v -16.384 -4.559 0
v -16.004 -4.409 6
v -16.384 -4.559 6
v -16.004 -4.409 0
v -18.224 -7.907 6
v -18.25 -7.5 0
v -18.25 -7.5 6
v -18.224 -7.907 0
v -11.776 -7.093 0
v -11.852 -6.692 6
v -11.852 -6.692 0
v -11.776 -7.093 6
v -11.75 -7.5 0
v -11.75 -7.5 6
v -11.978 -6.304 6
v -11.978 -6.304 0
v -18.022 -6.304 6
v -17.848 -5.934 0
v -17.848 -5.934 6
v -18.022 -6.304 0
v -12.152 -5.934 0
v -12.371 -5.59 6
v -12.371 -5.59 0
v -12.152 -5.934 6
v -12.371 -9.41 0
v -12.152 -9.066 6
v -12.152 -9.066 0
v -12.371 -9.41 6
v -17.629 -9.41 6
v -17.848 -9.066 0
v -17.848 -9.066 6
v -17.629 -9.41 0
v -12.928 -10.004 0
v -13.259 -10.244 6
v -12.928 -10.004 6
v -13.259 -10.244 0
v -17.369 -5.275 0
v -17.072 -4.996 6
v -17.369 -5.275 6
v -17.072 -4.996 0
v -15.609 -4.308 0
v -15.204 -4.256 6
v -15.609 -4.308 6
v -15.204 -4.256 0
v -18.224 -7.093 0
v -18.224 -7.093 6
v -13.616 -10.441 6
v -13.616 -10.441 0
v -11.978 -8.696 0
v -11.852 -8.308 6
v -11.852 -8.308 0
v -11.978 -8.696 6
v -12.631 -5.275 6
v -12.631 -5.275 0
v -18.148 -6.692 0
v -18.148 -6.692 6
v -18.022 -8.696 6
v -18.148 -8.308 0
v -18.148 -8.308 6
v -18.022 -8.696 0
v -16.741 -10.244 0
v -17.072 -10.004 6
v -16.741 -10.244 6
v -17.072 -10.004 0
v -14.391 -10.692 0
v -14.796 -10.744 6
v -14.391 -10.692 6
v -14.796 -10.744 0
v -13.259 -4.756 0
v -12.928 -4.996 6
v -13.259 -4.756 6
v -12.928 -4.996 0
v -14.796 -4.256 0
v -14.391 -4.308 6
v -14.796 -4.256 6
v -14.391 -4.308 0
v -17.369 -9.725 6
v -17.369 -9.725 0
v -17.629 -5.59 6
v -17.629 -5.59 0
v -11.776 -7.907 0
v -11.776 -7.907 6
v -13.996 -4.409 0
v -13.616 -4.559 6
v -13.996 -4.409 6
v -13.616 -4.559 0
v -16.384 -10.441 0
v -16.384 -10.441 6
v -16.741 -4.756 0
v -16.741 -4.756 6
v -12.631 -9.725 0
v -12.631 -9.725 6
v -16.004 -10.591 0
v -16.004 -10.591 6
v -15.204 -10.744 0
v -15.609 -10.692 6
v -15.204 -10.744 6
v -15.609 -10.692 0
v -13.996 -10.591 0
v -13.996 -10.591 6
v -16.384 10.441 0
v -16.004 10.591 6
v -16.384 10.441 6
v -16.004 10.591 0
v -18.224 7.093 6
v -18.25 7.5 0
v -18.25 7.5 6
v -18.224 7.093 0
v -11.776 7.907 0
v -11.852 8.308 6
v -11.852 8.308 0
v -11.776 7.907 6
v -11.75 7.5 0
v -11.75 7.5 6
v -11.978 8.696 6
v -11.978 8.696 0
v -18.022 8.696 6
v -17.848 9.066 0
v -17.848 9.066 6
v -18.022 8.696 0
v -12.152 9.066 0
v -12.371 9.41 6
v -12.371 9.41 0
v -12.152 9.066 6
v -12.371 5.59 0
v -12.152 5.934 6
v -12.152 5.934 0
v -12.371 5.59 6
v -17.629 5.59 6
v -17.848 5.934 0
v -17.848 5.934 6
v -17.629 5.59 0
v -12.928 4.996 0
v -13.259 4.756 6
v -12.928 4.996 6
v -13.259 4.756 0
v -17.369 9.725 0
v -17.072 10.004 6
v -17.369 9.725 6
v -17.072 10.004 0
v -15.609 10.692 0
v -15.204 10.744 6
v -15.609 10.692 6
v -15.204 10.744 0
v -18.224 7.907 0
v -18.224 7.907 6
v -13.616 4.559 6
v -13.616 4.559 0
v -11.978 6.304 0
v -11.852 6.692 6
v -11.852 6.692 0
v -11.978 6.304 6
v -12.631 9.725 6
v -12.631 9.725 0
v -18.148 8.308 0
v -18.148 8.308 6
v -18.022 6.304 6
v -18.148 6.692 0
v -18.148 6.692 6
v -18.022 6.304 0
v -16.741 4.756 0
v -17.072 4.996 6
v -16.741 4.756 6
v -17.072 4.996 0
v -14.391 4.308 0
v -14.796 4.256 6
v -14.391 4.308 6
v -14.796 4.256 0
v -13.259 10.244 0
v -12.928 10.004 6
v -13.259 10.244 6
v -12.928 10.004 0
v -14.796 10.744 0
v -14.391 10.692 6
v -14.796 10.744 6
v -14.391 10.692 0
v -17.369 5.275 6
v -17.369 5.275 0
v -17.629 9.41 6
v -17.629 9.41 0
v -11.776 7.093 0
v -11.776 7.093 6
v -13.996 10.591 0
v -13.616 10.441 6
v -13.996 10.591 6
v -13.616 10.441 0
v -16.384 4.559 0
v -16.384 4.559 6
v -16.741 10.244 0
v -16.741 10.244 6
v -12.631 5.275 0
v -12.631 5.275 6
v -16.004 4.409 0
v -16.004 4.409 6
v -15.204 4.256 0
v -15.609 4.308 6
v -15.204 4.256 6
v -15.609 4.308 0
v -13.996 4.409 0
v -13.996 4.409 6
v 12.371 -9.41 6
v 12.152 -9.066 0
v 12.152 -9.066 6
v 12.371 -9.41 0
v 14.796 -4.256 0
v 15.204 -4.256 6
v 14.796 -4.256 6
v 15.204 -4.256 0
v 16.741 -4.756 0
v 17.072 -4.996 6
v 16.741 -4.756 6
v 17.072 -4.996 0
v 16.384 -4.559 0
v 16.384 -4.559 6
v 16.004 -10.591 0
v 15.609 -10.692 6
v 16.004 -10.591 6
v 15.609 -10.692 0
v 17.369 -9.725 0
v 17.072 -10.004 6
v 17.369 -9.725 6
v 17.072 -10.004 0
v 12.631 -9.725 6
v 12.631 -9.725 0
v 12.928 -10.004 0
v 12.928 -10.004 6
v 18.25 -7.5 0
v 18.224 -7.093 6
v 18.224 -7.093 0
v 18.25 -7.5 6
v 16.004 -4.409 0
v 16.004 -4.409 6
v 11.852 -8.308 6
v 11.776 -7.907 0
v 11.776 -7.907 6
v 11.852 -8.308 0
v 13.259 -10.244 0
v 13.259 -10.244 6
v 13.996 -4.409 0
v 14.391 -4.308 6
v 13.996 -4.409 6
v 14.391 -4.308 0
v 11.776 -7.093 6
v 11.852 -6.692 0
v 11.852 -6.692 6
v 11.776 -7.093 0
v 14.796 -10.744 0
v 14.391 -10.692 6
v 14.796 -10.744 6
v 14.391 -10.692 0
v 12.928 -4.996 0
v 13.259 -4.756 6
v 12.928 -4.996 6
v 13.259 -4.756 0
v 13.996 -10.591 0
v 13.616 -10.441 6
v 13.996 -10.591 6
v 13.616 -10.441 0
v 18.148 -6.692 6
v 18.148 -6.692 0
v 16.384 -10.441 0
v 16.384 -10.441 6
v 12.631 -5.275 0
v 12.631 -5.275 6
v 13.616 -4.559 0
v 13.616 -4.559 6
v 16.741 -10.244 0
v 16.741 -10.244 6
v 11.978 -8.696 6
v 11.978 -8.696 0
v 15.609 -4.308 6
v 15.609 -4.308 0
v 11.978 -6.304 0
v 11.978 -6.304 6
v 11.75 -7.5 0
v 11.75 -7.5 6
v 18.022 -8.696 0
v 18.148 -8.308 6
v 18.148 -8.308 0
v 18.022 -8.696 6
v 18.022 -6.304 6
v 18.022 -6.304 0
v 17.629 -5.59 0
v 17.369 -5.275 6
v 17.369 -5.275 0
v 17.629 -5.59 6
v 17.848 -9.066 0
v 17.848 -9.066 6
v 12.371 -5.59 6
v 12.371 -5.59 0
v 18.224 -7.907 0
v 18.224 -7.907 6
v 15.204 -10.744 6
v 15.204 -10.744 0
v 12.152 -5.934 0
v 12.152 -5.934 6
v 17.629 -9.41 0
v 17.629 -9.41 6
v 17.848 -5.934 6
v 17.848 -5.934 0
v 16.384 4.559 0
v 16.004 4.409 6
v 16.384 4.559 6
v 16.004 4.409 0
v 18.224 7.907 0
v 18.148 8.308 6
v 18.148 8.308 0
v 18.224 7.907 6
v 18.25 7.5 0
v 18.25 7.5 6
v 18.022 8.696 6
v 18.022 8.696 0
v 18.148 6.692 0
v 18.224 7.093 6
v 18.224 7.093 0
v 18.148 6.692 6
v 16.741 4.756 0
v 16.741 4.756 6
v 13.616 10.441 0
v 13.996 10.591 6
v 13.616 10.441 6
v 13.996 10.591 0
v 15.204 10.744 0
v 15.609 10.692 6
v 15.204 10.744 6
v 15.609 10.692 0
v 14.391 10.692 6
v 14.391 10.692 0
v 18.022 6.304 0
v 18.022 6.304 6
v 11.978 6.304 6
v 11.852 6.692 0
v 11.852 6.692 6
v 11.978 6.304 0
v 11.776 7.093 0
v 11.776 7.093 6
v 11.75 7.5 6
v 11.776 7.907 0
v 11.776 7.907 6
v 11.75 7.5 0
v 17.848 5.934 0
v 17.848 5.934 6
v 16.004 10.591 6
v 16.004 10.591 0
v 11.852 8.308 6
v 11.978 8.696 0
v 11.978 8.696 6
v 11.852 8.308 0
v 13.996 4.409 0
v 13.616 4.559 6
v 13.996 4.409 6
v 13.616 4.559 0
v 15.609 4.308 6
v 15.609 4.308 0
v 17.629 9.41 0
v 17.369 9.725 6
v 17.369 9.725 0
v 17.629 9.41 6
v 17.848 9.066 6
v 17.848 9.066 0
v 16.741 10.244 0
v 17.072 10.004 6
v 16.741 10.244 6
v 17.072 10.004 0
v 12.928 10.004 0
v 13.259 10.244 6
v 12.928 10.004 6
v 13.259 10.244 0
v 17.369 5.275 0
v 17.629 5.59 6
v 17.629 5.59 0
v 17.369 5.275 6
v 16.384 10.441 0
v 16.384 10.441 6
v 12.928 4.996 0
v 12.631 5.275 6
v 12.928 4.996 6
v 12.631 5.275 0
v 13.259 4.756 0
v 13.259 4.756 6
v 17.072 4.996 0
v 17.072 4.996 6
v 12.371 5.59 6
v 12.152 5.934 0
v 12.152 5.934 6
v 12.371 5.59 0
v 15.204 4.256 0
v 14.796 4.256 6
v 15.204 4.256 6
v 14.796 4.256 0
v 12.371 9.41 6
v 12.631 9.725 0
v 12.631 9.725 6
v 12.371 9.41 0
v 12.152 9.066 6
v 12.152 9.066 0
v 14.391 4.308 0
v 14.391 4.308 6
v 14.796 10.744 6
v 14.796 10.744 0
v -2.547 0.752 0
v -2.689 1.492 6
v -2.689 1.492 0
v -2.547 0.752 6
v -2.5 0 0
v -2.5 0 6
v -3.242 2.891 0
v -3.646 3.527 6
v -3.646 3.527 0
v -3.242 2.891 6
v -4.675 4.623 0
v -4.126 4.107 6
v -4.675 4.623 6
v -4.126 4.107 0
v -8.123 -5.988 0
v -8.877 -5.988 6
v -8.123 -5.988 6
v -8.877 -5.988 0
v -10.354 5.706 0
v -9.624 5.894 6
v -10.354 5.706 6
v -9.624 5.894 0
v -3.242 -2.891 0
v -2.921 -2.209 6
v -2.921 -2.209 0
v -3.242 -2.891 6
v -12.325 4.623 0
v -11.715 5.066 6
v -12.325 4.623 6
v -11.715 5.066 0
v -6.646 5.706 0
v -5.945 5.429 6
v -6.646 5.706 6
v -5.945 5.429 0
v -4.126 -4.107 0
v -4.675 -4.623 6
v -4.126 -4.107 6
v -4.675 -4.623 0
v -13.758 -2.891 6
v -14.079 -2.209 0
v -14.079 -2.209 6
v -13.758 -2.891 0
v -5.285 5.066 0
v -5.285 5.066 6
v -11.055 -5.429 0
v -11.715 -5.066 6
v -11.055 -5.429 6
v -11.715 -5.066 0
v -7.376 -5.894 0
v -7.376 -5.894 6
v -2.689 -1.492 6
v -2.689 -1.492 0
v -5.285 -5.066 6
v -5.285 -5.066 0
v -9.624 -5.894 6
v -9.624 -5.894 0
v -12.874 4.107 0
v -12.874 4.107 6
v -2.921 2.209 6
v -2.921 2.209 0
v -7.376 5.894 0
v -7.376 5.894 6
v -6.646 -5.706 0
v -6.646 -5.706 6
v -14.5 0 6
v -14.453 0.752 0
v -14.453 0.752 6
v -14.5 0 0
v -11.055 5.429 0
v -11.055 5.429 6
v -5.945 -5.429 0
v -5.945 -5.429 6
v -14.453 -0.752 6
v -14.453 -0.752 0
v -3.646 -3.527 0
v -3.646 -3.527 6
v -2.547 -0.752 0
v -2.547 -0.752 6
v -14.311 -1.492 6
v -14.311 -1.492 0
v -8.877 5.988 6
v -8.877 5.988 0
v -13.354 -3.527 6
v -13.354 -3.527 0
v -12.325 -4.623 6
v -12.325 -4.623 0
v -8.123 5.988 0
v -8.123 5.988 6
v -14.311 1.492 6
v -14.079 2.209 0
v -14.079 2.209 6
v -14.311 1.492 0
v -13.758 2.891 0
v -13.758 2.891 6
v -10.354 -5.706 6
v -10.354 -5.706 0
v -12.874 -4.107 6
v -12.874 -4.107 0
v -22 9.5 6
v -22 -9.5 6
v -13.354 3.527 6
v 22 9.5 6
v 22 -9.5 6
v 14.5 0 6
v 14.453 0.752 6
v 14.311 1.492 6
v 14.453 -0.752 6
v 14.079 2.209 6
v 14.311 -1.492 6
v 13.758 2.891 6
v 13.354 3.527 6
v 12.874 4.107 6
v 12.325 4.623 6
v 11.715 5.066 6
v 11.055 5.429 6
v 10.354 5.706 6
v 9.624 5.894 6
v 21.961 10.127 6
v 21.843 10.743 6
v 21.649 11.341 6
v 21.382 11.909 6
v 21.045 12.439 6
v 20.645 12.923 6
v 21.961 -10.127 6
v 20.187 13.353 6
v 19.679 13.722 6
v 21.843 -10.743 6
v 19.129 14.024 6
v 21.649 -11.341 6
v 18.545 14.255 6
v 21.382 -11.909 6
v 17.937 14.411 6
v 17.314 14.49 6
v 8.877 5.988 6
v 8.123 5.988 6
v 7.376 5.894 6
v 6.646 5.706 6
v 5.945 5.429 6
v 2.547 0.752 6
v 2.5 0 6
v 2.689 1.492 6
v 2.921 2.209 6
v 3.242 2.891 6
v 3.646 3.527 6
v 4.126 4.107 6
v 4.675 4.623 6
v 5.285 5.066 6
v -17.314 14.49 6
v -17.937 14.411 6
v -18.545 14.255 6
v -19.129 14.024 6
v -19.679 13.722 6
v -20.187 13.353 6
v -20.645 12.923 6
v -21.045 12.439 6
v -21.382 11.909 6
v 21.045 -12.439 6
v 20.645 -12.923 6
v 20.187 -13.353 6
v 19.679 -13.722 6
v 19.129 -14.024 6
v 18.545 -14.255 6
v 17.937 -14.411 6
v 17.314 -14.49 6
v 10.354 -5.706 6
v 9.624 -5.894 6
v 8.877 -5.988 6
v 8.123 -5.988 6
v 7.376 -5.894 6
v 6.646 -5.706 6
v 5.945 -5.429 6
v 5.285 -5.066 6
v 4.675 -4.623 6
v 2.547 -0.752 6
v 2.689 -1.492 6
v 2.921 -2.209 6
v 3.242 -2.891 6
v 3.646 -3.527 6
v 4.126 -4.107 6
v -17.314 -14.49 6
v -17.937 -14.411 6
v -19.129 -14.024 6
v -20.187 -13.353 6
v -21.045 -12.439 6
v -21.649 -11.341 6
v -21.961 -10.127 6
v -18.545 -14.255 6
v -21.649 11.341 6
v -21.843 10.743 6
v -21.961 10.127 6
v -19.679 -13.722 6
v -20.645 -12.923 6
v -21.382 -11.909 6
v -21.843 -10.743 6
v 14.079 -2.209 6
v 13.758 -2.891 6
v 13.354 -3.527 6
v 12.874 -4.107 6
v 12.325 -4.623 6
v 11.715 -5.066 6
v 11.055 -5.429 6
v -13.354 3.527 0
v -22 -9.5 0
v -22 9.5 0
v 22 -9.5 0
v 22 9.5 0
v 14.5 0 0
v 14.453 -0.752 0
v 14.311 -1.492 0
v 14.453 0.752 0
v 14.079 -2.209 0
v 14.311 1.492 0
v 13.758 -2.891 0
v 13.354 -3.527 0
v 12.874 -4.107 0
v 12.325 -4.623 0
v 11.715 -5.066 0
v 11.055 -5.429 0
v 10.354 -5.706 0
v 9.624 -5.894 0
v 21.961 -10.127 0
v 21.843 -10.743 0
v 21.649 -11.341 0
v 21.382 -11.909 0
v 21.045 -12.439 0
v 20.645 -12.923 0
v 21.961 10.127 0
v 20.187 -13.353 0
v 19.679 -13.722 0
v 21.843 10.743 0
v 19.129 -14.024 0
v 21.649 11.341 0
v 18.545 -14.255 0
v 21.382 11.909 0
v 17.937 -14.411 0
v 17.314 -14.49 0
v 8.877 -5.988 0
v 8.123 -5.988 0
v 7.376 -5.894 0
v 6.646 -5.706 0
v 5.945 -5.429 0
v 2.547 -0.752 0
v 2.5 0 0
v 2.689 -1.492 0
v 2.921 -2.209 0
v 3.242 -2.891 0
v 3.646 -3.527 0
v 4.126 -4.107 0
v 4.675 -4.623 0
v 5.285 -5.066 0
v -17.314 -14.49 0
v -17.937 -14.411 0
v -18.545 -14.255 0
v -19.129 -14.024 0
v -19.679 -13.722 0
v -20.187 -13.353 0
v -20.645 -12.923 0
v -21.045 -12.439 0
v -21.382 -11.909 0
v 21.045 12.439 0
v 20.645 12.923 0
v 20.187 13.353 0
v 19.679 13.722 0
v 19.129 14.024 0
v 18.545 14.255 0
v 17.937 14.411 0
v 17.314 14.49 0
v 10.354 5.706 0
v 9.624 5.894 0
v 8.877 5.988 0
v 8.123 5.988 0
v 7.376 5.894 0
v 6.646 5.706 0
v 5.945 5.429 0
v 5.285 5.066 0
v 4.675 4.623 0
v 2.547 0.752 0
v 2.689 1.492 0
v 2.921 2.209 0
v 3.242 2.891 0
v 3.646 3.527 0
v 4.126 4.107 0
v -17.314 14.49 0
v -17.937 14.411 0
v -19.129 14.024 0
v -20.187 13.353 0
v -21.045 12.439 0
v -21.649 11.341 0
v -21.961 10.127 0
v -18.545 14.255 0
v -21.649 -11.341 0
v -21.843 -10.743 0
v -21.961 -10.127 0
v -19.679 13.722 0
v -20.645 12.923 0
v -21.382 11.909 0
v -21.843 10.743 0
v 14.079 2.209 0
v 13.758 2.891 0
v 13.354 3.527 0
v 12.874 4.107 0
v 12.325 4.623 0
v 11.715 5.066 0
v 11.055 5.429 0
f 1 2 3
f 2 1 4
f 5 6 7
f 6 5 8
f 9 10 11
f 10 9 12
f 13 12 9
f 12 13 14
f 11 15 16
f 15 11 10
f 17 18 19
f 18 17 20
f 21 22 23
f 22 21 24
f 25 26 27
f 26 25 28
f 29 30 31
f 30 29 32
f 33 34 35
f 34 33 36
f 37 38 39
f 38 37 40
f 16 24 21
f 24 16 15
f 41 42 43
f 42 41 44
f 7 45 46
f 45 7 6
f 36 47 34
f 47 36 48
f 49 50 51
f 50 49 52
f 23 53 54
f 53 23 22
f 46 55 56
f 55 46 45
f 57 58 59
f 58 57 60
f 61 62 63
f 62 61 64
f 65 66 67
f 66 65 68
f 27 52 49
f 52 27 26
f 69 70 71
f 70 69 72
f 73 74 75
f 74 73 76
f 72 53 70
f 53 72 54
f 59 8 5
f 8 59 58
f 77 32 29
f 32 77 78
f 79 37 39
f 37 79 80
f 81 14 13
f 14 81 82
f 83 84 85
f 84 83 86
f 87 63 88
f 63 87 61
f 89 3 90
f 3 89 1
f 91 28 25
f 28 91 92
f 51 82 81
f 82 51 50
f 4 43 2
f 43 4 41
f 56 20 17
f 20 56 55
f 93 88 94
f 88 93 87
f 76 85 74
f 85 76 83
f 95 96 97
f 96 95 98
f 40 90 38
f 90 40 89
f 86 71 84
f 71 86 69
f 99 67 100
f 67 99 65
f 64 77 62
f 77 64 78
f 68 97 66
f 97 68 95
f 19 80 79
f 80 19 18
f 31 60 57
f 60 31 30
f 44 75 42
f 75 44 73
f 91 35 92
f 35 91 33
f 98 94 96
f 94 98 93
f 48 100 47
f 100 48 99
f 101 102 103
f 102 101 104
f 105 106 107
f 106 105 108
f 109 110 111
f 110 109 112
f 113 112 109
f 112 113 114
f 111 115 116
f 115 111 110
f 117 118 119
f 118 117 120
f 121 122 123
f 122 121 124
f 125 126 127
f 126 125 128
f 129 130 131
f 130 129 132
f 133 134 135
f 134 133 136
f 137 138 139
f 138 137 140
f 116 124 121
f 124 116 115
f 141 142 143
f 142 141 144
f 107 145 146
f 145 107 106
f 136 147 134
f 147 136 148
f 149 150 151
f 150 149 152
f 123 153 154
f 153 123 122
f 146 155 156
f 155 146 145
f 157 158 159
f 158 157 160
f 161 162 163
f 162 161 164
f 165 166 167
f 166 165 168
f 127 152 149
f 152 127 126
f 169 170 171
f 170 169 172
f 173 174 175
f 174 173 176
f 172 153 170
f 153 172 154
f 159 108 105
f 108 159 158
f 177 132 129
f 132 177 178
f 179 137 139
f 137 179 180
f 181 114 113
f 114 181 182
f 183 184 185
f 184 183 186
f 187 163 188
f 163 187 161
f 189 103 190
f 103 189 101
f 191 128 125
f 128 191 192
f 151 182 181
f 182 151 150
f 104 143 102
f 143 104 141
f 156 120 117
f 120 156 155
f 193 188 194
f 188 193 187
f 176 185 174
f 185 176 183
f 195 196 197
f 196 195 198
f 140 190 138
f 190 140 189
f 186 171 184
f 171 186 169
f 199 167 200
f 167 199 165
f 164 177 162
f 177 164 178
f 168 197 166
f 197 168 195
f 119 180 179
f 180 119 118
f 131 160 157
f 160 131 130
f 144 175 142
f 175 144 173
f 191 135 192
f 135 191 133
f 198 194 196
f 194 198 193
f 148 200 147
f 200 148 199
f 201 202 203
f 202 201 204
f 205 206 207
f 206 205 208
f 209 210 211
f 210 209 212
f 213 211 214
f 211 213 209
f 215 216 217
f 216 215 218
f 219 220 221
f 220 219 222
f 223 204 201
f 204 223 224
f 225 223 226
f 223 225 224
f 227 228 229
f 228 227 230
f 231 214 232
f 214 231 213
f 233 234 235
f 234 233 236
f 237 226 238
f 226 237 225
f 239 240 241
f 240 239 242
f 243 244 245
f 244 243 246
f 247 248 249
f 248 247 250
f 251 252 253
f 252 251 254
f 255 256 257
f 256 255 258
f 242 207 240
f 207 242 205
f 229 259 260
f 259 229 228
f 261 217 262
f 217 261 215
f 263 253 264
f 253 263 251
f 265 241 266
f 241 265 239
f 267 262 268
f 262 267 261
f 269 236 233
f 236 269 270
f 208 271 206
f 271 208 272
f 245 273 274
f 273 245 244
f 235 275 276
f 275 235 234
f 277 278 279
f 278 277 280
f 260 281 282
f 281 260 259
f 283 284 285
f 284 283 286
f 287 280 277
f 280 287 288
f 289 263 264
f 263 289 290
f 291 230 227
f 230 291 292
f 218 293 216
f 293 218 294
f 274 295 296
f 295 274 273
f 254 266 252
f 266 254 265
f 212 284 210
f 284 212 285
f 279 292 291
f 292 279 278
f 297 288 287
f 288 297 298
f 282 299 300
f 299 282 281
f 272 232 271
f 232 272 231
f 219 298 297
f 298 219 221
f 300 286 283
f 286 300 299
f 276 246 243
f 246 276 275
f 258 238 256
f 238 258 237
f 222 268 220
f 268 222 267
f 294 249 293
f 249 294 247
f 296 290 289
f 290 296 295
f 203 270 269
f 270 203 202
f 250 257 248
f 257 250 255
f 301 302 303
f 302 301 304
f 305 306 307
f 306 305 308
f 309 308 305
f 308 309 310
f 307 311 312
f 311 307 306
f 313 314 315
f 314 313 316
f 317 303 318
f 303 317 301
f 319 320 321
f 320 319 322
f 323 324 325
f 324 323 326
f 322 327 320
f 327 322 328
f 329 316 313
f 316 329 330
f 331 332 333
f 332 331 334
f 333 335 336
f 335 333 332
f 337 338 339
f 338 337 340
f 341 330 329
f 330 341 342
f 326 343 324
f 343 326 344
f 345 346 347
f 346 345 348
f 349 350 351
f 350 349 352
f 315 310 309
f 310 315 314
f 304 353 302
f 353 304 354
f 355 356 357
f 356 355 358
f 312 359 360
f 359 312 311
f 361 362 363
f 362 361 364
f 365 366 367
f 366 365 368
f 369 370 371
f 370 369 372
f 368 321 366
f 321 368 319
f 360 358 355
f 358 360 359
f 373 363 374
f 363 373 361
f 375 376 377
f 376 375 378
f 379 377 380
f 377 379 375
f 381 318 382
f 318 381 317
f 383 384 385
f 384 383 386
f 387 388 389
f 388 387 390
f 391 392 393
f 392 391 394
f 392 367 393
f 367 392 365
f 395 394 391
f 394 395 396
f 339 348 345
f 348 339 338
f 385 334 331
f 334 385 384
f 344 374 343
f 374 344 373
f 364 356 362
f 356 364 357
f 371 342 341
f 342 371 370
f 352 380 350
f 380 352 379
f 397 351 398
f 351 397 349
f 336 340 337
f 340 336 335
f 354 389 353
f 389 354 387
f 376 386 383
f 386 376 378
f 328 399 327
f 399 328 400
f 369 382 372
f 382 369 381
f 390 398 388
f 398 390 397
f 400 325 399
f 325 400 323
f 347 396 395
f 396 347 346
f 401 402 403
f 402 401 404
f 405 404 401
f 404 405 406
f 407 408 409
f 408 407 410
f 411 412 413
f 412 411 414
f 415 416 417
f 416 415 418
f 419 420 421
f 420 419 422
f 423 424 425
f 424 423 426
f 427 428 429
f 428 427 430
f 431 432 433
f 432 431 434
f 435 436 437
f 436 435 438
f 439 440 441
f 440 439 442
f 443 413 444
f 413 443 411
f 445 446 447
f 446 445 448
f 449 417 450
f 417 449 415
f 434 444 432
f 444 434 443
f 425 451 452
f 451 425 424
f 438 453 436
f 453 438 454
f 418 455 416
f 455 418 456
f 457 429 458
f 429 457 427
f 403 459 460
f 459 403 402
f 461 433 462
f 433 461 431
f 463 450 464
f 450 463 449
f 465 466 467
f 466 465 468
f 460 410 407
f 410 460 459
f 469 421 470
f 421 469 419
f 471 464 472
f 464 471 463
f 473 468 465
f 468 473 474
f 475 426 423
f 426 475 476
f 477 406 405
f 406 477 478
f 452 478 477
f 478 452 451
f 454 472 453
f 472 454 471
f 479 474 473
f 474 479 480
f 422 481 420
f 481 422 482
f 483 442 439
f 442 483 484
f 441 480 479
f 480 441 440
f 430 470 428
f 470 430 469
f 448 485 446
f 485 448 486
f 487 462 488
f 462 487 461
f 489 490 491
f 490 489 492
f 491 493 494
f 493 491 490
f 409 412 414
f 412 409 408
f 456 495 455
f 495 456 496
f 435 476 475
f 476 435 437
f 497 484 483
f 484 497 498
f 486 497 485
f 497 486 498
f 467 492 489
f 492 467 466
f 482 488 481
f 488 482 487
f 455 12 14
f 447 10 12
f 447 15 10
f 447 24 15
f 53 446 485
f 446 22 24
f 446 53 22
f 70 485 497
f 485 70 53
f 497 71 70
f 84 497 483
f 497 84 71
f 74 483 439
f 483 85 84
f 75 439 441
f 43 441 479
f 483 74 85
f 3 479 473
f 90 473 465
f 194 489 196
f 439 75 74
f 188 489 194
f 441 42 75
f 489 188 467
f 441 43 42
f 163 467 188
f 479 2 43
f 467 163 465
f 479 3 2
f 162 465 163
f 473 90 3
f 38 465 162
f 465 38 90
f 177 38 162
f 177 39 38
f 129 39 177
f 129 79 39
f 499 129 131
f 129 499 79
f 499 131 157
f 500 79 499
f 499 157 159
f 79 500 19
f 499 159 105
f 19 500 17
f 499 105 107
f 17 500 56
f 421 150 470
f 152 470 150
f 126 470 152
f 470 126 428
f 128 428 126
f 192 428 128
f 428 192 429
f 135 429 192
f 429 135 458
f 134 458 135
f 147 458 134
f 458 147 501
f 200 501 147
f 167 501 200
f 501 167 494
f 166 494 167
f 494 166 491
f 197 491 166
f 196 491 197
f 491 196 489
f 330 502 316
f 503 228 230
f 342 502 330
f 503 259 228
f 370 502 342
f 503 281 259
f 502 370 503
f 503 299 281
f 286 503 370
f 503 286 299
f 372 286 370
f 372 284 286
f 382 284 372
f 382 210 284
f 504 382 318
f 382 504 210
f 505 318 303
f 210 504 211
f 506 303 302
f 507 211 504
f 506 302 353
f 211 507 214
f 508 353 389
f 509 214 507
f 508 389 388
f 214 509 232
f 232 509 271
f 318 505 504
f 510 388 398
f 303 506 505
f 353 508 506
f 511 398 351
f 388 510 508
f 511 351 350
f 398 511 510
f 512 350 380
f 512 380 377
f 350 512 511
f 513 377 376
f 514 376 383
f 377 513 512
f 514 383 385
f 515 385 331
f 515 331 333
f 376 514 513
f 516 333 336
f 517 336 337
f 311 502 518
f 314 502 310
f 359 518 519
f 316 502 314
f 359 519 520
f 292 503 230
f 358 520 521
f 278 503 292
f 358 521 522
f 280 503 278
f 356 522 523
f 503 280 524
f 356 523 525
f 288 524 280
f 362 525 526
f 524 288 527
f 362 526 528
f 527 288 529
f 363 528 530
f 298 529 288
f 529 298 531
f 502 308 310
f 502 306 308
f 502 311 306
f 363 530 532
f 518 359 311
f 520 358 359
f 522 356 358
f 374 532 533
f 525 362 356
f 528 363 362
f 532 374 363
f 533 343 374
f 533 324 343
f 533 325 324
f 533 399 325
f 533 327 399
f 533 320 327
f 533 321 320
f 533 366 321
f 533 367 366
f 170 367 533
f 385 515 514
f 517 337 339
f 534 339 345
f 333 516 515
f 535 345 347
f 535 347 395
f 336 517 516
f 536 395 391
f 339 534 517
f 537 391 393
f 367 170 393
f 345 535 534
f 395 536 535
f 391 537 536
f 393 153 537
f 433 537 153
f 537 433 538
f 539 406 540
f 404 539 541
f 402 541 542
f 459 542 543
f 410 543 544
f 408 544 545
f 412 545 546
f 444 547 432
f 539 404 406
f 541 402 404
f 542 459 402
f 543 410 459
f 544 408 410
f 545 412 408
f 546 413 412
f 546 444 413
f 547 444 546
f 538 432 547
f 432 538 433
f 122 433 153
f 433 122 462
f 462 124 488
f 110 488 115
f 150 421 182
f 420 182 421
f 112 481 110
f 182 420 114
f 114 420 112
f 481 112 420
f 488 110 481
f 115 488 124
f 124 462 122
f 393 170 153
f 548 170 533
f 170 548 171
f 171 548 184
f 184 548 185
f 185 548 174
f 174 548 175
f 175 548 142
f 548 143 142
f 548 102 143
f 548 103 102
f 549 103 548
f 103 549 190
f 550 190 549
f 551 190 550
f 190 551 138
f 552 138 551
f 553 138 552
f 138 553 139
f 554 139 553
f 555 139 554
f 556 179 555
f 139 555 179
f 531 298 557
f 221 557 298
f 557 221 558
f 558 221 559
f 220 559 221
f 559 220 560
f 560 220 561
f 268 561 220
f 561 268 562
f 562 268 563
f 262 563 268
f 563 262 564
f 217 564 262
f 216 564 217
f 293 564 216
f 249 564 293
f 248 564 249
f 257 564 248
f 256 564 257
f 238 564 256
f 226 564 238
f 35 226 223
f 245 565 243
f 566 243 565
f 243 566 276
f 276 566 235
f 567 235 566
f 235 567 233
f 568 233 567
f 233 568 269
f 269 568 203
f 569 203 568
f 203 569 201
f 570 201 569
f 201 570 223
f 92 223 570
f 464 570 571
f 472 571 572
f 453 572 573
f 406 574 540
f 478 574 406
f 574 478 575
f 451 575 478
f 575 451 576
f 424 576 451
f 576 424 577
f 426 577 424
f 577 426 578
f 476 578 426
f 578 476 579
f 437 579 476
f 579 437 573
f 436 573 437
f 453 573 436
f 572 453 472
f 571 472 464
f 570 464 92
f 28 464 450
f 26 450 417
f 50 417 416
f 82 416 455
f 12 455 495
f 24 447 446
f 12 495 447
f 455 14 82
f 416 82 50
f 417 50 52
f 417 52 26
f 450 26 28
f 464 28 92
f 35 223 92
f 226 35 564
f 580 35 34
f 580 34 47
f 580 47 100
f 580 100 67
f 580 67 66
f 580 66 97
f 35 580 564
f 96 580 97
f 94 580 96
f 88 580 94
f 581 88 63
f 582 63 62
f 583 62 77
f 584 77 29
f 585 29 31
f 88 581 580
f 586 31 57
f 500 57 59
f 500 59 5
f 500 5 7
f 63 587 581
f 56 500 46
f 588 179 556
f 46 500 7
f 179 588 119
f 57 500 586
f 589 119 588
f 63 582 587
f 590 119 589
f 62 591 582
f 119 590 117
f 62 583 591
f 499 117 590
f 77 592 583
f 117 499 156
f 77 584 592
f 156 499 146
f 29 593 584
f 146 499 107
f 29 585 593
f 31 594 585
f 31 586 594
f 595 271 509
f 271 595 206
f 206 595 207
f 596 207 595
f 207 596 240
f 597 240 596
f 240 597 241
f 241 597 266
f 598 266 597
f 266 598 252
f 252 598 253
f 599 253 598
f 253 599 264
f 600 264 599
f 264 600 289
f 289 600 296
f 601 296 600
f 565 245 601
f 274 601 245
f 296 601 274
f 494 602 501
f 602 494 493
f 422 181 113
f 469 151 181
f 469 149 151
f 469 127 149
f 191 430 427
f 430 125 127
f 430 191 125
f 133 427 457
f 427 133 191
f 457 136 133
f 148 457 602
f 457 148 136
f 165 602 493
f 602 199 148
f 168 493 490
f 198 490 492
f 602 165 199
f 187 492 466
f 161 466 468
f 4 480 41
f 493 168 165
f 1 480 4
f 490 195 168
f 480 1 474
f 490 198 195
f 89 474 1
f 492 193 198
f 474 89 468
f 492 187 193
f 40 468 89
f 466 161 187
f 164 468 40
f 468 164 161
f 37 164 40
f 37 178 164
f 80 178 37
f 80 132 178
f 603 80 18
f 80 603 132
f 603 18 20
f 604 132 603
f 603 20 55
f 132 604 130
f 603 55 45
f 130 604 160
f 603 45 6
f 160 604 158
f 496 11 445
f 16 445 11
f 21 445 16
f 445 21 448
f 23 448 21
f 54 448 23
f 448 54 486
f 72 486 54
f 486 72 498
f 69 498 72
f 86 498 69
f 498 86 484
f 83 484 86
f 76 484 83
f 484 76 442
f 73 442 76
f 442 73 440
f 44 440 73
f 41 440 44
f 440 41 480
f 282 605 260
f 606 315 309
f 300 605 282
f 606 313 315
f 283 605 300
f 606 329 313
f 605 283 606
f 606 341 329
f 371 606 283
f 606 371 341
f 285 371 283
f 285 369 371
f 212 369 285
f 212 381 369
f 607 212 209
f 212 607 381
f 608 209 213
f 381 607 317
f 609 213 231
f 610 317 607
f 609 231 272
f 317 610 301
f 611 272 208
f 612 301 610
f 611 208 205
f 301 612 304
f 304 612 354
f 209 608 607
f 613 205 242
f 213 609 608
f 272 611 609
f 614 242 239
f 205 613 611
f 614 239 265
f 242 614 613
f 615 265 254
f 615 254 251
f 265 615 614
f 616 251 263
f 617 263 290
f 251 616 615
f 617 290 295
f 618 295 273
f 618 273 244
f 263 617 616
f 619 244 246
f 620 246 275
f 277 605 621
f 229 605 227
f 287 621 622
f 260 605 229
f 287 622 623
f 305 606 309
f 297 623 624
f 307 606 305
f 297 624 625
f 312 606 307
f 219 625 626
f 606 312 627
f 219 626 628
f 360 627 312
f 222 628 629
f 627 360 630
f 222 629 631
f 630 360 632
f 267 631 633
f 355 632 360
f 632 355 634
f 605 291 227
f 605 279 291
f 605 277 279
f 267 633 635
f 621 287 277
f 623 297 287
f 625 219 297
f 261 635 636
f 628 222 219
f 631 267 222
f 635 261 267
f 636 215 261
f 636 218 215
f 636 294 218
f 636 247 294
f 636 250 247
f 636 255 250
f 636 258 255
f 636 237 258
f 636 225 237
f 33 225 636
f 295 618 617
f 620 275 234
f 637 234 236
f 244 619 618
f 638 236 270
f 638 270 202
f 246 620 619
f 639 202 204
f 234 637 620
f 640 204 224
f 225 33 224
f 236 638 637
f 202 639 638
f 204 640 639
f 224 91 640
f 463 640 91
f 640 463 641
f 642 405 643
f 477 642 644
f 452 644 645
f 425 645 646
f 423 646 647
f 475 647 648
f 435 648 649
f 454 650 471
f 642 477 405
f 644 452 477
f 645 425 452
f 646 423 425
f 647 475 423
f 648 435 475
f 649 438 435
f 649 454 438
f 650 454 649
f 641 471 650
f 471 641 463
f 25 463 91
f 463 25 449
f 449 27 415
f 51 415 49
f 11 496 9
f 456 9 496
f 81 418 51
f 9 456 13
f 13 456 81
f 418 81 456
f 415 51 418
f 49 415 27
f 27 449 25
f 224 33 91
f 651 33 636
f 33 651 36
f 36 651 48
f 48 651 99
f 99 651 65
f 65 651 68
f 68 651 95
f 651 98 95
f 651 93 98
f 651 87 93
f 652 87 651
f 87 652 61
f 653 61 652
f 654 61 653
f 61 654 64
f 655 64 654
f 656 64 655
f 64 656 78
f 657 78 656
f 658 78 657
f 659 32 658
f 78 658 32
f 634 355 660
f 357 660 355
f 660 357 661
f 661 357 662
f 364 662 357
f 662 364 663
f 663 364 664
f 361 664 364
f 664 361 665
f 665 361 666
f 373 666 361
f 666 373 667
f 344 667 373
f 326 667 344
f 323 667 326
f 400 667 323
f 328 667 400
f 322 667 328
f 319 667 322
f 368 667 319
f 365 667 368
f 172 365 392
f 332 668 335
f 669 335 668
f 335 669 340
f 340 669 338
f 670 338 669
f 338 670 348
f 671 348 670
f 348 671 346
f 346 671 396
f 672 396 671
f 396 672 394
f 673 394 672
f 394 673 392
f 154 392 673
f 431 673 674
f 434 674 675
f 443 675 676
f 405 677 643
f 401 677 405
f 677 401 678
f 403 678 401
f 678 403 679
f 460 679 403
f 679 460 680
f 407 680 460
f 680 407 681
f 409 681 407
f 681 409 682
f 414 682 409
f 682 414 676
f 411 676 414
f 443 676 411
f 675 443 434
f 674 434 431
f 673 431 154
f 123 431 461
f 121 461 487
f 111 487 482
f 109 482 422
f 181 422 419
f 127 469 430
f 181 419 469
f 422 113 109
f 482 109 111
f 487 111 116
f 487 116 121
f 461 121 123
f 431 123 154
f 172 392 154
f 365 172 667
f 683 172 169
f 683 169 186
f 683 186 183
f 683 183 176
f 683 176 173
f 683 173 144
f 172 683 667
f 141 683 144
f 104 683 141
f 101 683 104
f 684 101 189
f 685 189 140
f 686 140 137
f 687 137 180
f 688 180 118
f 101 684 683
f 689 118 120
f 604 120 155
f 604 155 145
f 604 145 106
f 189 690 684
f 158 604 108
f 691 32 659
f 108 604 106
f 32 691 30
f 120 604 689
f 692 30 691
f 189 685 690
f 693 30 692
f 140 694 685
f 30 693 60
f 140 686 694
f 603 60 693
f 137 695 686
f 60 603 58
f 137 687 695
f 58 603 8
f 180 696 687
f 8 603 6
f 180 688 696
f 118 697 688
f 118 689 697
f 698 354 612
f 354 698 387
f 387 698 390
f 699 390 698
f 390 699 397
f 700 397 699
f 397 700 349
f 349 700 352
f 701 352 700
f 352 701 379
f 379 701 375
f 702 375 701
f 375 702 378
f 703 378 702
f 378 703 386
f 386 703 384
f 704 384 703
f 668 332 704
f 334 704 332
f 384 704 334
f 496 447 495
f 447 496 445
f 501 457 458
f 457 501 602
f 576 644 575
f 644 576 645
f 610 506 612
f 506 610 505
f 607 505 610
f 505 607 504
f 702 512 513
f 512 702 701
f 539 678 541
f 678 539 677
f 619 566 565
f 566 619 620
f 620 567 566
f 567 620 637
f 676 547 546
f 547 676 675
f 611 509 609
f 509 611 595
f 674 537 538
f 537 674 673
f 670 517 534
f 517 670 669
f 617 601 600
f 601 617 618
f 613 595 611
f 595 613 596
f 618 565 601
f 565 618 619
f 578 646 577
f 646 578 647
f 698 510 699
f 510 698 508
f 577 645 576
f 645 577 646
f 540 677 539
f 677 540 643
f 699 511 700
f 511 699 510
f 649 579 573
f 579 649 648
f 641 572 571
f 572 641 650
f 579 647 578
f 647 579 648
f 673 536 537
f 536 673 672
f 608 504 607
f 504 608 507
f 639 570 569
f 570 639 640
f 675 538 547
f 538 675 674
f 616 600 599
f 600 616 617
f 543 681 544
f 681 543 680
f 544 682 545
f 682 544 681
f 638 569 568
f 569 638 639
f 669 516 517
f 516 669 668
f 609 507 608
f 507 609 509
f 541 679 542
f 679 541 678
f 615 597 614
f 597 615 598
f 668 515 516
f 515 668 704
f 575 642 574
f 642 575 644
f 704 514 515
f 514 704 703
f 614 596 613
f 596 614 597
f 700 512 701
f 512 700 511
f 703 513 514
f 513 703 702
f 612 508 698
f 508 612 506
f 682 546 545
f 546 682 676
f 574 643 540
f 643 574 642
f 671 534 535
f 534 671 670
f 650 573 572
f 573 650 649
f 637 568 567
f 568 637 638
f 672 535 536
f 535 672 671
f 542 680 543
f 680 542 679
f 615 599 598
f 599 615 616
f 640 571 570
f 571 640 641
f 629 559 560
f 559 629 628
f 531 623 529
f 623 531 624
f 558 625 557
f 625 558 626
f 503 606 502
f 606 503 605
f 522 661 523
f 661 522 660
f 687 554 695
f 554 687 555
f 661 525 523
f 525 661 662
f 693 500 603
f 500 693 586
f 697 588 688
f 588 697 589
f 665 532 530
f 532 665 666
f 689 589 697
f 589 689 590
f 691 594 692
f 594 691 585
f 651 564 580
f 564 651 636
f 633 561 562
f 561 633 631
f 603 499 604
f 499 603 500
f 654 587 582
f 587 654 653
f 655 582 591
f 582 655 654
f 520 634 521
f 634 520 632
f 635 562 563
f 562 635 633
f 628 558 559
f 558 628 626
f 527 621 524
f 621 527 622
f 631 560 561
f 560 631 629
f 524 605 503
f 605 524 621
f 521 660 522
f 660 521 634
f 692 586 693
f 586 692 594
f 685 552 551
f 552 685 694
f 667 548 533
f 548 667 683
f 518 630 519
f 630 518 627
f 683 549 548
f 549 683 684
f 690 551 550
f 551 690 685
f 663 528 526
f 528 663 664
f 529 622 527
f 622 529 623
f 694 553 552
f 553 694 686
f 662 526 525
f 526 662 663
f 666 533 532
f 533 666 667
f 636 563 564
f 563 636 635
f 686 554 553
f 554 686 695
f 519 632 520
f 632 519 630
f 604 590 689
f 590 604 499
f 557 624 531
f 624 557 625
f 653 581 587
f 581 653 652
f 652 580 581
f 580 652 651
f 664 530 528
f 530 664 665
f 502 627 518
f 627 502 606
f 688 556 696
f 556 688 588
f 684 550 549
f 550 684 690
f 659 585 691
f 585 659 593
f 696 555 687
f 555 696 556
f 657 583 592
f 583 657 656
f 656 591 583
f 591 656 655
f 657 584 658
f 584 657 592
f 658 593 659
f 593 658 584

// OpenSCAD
$fn = 50;


difference() {
	union() {
		hull() {
			translate(v = [-17.0000000000, 9.5000000000, 0]) {
				cylinder(h = 6, r = 5);
			}
			translate(v = [17.0000000000, 9.5000000000, 0]) {
				cylinder(h = 6, r = 5);
			}
			translate(v = [-17.0000000000, -9.5000000000, 0]) {
				cylinder(h = 6, r = 5);
			}
			translate(v = [17.0000000000, -9.5000000000, 0]) {
				cylinder(h = 6, r = 5);
			}
		}
	}
	union() {
		#translate(v = [-15.0000000000, -7.5000000000, -100.0000000000]) {
			cylinder(h = 200, r = 3.2500000000);
		}
		#translate(v = [-15.0000000000, 7.5000000000, -100.0000000000]) {
			cylinder(h = 200, r = 3.2500000000);
		}
		#translate(v = [15.0000000000, -7.5000000000, -100.0000000000]) {
			cylinder(h = 200, r = 3.2500000000);
		}
		#translate(v = [15.0000000000, 7.5000000000, -100.0000000000]) {
			cylinder(h = 200, r = 3.2500000000);
		}
		#translate(v = [-8.5000000000, 0, 0]) {
			cylinder(h = 6, r = 6.0000000000);
		}
		#translate(v = [8.5000000000, 0, 0]) {
			cylinder(h = 6, r = 6.0000000000);
		}
	}
}
